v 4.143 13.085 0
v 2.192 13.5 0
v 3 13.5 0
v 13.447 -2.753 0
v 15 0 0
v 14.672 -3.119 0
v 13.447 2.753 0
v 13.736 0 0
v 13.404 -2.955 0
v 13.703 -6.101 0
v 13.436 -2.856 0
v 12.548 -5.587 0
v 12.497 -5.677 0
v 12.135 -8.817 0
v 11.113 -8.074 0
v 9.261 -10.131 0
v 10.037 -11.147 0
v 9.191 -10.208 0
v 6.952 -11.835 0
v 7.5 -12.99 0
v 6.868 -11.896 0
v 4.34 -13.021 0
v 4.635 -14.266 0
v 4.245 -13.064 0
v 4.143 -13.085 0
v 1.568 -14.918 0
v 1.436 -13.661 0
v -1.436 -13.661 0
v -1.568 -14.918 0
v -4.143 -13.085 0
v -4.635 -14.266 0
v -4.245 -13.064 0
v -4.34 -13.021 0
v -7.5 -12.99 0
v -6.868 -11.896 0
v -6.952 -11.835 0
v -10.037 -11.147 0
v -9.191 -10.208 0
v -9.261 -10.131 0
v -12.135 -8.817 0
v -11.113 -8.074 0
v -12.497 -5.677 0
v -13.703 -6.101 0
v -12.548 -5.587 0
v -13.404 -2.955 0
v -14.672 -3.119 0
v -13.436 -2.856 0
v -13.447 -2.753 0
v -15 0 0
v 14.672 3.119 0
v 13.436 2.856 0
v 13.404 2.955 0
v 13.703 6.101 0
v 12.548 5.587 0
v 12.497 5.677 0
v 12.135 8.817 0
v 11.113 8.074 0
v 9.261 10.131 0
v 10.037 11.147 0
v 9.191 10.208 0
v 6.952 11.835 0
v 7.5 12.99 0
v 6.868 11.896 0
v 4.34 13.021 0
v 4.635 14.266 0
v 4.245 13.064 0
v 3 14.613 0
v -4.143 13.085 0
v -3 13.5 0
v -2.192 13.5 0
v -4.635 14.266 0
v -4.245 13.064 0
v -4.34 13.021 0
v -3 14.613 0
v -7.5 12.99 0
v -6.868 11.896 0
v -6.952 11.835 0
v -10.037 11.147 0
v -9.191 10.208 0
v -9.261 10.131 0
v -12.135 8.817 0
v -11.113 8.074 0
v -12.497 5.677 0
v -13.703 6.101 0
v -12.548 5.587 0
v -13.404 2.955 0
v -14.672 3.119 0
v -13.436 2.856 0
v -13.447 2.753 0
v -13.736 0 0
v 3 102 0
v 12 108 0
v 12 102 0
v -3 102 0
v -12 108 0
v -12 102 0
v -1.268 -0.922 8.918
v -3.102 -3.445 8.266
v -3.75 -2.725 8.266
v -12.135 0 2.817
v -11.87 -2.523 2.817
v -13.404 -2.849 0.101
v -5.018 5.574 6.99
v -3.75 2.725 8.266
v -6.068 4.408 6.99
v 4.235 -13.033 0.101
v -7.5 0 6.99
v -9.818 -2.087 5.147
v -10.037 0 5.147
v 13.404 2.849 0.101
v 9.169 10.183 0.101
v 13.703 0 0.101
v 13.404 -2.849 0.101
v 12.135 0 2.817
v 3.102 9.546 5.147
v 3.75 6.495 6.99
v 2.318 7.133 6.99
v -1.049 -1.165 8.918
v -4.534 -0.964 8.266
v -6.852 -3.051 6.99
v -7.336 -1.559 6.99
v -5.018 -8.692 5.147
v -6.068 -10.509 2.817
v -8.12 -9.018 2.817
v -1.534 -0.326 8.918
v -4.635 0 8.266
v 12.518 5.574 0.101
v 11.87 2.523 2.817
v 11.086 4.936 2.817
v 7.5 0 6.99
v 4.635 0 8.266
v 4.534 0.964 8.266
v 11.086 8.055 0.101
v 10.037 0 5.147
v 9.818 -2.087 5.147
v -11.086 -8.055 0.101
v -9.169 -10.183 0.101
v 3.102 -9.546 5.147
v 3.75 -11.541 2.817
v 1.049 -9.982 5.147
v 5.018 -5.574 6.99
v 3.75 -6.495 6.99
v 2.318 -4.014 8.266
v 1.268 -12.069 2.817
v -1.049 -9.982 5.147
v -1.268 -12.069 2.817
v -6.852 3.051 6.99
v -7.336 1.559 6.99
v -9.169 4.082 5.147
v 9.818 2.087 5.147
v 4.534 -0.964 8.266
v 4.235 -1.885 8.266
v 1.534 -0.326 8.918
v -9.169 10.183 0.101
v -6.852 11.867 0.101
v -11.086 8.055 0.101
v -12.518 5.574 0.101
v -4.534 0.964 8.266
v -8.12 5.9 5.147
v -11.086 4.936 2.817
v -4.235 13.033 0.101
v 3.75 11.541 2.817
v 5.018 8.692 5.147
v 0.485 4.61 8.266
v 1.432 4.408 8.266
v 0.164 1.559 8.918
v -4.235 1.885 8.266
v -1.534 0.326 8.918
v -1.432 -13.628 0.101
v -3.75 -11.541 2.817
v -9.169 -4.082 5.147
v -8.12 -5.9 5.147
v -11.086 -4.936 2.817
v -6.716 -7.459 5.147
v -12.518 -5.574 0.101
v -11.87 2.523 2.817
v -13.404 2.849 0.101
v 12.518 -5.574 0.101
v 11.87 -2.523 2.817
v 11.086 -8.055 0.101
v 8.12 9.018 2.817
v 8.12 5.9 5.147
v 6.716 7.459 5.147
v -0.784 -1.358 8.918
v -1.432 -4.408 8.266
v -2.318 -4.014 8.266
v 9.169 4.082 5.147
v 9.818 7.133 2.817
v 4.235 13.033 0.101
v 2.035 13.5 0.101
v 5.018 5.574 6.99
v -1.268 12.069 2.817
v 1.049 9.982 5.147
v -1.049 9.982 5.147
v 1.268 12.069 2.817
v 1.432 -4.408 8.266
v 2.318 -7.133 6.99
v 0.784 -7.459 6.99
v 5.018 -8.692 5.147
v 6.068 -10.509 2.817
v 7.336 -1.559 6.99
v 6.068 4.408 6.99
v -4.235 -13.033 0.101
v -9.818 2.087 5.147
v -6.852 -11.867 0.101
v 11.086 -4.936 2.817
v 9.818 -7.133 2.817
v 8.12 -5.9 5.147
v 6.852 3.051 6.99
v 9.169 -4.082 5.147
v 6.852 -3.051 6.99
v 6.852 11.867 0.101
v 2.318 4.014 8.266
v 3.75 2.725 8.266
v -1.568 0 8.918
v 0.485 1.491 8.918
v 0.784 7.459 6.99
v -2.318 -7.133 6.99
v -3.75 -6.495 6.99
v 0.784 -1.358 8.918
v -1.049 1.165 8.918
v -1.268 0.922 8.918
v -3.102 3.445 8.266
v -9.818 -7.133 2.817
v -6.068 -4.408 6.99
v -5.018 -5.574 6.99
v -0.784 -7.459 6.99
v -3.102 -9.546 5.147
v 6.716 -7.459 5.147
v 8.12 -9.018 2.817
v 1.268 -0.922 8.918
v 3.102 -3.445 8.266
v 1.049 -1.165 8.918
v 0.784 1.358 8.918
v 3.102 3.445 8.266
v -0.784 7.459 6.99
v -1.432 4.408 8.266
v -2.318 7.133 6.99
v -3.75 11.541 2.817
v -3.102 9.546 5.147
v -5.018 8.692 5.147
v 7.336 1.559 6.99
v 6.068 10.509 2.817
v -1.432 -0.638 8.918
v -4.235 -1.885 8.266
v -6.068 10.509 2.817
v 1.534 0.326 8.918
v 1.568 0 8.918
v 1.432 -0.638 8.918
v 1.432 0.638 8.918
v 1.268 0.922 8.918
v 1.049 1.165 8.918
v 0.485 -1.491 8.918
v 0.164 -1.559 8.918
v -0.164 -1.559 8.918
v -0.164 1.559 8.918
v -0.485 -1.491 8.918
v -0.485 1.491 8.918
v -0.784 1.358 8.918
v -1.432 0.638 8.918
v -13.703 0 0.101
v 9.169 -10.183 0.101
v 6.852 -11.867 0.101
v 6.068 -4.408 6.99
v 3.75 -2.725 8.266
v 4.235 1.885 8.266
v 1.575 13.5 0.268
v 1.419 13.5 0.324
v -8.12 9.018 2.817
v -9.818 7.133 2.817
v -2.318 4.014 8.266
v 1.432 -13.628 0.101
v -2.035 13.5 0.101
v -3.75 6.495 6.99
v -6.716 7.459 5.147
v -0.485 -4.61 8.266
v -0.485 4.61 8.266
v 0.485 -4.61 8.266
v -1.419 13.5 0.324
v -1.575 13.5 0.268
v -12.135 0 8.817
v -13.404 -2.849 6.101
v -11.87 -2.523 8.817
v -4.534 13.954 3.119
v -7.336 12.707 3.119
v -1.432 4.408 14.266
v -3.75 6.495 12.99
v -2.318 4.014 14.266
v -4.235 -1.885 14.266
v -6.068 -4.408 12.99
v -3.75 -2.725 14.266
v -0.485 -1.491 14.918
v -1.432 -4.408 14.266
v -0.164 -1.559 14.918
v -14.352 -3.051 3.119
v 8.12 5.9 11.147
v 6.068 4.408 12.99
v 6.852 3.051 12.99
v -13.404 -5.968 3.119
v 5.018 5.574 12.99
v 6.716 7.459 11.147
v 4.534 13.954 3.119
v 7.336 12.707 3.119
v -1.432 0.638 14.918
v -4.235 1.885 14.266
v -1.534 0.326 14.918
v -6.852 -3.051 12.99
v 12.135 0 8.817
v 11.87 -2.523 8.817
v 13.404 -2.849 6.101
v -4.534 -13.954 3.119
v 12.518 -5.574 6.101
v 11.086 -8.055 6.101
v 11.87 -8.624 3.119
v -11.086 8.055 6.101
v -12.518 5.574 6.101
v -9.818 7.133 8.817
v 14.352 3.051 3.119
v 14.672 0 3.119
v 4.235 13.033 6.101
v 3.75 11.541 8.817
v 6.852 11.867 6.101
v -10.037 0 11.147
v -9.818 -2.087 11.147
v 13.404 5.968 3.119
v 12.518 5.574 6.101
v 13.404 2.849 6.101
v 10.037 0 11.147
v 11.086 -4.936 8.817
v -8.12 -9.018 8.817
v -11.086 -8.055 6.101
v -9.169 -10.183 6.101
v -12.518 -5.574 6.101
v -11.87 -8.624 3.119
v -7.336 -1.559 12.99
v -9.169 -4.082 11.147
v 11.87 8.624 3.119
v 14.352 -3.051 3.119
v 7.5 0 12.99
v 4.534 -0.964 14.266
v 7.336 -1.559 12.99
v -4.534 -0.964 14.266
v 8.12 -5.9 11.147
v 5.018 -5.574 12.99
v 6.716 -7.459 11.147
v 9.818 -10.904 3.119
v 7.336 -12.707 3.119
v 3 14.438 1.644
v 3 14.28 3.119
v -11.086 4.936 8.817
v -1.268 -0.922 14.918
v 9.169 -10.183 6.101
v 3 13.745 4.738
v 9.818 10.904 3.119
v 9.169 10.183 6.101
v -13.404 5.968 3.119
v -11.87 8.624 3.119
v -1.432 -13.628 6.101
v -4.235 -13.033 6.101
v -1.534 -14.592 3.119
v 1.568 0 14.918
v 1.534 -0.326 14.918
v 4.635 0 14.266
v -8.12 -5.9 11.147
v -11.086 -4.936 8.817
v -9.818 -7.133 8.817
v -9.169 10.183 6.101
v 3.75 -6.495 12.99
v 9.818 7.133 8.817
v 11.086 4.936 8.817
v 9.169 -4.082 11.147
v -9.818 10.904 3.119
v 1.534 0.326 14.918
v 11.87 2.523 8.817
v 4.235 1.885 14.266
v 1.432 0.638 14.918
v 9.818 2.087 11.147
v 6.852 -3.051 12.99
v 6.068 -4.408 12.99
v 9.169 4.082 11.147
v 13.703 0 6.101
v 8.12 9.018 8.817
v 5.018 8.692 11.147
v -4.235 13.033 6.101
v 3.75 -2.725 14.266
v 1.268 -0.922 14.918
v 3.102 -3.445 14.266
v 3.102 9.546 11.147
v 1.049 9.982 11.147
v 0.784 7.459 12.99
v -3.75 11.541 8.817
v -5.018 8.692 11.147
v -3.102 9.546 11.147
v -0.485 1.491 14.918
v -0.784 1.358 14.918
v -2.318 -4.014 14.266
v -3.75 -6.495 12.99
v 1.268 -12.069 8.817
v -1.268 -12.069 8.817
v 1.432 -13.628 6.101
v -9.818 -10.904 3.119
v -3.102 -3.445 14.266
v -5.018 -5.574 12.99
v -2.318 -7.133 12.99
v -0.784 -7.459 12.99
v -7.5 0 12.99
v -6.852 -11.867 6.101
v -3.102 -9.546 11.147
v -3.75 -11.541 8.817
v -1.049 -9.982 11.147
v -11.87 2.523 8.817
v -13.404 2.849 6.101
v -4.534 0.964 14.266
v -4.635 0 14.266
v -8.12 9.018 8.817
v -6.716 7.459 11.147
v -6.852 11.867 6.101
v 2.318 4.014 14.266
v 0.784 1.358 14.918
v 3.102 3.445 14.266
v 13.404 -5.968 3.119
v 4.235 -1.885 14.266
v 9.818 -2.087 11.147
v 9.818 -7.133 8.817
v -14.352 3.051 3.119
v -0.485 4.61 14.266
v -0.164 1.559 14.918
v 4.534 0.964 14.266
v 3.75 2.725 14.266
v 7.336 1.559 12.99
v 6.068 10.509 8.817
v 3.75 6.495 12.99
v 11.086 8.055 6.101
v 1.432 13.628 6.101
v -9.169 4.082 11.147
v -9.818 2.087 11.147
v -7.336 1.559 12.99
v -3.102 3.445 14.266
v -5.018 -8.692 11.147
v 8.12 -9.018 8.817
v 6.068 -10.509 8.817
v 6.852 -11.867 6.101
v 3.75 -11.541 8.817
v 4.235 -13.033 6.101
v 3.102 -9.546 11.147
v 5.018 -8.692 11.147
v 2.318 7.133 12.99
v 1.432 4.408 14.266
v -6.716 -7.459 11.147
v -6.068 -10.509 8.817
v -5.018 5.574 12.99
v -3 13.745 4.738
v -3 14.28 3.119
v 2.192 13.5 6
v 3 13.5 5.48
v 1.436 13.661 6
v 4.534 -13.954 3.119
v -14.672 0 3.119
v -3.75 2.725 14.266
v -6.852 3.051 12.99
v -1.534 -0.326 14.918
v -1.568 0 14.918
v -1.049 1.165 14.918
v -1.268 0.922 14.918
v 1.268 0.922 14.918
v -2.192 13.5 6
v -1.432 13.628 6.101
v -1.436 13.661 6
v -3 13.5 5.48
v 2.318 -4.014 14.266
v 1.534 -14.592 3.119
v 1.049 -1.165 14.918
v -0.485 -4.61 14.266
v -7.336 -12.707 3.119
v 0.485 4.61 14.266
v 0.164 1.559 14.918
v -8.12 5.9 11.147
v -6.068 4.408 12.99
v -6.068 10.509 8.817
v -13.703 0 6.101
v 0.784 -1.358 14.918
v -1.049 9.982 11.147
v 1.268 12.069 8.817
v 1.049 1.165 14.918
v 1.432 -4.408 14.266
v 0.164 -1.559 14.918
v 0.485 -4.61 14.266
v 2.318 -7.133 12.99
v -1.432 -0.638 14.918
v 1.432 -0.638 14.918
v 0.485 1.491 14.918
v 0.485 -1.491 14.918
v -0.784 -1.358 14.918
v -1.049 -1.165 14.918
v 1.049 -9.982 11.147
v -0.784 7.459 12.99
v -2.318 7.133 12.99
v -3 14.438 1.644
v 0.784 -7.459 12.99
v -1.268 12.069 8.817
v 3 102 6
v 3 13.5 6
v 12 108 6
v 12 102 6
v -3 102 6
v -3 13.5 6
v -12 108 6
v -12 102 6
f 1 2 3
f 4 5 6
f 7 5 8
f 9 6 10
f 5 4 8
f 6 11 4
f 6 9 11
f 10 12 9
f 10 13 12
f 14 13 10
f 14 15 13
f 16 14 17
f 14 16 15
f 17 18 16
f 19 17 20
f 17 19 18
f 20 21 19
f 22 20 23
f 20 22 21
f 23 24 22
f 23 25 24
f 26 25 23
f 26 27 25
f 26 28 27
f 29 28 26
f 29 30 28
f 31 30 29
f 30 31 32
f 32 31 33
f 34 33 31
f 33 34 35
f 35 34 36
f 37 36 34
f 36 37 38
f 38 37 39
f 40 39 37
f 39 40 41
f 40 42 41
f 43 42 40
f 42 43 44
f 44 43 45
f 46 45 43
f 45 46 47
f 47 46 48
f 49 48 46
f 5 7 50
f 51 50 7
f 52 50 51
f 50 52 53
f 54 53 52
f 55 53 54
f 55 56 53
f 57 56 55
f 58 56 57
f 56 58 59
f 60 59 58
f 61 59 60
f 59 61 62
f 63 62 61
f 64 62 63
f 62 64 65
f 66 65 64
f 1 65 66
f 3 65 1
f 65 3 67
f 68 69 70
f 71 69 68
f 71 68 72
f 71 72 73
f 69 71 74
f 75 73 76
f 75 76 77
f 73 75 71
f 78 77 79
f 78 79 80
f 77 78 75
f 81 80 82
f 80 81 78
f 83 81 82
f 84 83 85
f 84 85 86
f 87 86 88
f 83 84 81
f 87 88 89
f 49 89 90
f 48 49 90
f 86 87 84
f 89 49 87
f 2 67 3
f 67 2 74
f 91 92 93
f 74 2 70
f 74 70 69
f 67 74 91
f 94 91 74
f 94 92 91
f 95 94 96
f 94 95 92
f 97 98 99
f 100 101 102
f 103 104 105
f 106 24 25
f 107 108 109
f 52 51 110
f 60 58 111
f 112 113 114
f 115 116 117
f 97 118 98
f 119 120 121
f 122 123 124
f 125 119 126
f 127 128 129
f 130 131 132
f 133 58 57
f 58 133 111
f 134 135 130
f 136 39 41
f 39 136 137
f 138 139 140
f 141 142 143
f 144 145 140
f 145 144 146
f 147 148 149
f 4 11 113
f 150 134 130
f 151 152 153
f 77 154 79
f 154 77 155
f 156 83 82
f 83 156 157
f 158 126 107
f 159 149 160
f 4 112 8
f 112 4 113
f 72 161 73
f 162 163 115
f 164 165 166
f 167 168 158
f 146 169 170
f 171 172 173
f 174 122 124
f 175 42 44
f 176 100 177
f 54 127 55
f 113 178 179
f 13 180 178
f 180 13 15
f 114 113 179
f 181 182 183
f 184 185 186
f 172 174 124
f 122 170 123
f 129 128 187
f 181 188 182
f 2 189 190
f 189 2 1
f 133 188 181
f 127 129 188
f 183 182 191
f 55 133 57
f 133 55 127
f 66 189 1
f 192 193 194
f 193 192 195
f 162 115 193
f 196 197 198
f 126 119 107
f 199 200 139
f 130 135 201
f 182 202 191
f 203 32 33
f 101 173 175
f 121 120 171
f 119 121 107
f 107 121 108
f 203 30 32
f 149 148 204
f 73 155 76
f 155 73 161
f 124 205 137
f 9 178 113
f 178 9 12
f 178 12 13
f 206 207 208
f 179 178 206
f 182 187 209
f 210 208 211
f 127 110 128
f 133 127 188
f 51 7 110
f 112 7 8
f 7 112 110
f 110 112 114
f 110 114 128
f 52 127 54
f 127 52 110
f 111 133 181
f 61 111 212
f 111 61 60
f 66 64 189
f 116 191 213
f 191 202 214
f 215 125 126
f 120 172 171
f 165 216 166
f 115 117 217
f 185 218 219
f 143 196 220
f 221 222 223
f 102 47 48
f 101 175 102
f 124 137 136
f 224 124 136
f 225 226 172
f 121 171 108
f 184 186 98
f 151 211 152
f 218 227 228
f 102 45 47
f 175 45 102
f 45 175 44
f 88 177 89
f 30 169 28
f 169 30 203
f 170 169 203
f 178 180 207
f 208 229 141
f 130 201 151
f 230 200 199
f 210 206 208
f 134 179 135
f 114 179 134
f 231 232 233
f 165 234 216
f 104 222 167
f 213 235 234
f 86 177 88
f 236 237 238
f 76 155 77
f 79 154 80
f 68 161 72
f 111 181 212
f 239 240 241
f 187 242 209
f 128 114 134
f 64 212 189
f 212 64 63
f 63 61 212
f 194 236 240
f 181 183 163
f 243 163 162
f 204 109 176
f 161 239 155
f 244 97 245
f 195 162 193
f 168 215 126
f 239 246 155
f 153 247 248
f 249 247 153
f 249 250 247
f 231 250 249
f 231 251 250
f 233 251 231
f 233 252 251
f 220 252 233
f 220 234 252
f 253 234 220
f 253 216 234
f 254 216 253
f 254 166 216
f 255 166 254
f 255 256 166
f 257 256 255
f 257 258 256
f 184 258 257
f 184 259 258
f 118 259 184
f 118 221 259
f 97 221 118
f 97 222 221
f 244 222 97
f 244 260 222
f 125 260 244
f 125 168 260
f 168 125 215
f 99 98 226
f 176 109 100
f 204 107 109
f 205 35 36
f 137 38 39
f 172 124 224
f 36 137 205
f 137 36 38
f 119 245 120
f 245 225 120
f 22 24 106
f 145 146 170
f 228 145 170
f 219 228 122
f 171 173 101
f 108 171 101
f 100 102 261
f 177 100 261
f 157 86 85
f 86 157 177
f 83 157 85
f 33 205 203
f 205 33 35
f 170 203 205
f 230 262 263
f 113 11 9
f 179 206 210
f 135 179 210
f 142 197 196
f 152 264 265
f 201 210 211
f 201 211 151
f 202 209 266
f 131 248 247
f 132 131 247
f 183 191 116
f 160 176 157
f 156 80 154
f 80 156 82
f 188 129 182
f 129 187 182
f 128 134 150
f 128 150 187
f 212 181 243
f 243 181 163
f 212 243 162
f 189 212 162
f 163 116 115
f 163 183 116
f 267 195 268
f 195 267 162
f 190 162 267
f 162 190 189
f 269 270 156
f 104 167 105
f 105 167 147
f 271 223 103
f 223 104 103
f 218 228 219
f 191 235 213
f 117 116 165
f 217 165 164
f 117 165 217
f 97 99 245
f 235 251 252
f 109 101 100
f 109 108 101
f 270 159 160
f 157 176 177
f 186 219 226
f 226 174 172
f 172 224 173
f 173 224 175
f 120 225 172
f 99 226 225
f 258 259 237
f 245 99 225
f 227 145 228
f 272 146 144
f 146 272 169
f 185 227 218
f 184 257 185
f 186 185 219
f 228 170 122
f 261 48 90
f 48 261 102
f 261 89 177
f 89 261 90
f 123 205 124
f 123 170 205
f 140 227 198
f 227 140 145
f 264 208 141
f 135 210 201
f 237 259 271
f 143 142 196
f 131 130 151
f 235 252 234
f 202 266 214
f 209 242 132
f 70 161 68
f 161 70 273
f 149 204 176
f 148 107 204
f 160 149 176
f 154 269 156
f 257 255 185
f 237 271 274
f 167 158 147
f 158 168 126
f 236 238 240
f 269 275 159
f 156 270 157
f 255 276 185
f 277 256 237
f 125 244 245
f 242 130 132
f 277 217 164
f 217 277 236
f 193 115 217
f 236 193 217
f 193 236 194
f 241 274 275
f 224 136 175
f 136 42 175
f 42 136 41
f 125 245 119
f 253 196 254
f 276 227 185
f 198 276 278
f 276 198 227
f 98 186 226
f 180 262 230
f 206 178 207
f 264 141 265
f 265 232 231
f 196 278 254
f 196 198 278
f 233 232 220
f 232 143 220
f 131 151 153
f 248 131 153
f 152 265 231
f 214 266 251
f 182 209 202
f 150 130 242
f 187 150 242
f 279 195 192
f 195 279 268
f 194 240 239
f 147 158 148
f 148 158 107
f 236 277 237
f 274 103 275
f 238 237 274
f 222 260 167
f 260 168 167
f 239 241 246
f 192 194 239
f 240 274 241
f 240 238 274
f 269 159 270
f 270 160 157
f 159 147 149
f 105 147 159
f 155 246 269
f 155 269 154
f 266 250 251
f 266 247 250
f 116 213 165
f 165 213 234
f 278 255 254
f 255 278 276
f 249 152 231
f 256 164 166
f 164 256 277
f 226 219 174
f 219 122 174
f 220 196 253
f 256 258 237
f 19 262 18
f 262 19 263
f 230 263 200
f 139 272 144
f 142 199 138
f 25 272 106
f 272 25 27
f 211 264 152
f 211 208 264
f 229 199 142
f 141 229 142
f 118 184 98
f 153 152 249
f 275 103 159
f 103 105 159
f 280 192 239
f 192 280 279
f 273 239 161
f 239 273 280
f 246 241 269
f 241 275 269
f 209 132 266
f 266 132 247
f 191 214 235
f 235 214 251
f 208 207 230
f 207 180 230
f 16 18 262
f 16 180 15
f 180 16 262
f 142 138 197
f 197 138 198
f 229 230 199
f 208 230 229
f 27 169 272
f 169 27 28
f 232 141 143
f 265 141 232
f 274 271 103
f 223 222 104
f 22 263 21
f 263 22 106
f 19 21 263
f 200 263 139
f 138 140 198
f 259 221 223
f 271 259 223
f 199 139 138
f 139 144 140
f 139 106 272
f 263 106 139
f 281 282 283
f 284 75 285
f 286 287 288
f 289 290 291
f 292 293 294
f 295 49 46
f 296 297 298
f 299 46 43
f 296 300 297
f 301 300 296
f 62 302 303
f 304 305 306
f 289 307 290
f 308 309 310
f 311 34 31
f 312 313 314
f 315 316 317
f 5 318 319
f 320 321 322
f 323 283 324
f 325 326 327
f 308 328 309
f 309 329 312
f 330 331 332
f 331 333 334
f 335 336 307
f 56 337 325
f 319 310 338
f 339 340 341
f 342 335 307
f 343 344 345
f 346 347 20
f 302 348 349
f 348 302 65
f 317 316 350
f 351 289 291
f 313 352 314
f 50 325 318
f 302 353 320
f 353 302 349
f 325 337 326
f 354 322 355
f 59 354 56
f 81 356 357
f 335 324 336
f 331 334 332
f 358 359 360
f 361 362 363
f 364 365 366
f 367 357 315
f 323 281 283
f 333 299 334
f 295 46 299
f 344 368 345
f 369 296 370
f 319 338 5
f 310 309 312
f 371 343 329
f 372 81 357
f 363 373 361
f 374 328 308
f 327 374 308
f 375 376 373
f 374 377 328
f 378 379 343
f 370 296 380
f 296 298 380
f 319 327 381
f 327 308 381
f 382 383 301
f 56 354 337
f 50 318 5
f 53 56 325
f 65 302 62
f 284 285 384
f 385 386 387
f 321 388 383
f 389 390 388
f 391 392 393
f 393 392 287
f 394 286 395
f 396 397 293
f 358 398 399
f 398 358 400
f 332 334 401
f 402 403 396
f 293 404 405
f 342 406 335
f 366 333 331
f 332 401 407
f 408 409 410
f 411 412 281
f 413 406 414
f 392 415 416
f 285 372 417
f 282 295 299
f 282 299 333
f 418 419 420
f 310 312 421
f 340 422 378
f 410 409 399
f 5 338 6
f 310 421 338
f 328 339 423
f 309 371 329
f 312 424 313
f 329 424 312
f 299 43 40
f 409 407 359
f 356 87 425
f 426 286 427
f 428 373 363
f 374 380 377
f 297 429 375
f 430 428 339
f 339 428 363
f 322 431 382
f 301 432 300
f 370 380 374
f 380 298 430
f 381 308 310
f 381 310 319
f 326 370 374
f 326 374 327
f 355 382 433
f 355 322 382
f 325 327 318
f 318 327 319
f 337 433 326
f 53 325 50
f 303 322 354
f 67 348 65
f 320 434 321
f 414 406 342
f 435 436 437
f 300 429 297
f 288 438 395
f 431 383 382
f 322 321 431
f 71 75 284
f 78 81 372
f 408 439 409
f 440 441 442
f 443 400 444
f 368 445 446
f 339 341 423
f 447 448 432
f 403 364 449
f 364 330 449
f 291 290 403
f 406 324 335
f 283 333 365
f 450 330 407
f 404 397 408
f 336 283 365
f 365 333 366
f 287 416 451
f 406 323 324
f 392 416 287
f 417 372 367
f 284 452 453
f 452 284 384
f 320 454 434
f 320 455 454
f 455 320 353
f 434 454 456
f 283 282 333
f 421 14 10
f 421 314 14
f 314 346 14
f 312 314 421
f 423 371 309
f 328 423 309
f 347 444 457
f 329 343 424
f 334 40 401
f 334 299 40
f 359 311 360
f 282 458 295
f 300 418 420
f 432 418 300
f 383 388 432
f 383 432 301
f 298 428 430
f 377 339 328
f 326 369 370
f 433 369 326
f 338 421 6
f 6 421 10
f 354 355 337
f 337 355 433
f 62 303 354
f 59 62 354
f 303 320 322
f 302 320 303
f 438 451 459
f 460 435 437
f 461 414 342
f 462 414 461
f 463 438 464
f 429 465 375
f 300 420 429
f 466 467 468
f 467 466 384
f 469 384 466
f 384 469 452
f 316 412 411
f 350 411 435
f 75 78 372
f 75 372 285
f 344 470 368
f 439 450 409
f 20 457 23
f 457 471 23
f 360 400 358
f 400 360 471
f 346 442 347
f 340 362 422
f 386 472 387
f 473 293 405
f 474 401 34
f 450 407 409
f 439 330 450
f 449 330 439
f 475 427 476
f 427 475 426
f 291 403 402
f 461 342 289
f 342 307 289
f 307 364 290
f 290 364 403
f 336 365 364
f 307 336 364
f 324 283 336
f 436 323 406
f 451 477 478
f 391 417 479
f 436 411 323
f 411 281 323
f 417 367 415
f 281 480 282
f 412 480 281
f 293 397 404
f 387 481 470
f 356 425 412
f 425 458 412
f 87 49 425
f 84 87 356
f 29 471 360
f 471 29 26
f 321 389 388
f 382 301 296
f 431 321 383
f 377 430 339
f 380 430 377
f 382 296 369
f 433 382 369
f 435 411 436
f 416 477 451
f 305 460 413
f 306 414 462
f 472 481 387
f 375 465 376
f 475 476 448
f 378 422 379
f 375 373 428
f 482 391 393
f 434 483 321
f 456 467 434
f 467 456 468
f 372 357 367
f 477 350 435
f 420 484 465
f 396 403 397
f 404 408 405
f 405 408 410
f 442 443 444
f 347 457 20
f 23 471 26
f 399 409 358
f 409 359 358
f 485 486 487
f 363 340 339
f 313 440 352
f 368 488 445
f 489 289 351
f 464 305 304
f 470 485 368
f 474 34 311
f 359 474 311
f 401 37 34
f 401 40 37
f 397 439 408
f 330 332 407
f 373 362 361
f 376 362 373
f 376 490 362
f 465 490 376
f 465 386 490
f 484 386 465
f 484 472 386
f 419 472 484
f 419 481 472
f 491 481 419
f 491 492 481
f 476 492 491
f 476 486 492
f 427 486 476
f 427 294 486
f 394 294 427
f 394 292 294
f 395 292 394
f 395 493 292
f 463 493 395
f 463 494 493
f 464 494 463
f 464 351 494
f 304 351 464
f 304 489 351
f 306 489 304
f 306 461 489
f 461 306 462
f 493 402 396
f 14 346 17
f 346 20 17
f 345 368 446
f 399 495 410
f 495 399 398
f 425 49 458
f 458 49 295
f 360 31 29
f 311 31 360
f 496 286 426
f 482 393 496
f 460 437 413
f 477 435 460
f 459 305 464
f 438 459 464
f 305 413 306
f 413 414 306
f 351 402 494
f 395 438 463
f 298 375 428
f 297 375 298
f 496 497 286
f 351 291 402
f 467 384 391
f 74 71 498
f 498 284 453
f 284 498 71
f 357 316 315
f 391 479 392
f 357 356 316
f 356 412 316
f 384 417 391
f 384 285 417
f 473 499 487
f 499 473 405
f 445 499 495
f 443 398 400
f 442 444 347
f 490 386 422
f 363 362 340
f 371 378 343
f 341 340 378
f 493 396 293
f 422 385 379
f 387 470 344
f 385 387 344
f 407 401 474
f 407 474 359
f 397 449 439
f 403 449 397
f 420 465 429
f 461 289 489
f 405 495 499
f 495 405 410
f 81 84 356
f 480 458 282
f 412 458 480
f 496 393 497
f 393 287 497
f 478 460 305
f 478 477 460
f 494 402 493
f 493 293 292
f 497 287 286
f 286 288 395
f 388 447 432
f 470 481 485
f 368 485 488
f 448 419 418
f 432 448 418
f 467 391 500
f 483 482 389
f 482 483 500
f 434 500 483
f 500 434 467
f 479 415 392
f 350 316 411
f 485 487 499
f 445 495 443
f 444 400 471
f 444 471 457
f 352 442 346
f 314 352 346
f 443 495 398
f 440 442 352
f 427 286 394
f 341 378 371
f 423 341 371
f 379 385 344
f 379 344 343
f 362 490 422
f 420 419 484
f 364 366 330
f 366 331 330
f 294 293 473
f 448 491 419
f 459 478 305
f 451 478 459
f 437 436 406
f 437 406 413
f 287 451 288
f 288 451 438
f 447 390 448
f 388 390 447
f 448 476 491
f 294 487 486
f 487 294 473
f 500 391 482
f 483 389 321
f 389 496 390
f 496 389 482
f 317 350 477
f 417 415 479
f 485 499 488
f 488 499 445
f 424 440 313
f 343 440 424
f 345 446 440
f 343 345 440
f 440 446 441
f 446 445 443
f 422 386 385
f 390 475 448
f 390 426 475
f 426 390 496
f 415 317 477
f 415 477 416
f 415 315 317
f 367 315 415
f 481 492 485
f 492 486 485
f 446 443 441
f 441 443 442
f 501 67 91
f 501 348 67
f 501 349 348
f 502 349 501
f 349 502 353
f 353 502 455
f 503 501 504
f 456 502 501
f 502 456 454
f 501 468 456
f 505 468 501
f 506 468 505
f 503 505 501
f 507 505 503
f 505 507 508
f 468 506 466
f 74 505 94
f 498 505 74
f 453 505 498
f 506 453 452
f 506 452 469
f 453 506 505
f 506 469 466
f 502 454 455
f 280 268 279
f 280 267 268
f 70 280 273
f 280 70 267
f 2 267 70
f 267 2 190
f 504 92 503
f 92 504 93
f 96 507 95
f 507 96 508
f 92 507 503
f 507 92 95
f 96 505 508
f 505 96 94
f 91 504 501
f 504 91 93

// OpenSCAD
// Mereni rychlosti vetru
// snad odolna zamrznuti
// vnejsi prumer misky
dmiska = 30;
// tlouska steny misky
stena = 3;
// delka uchytu
luchyt = 3*dmiska;
// vnejsi prumer nosice
dnosic = 70;
// prumer nosne stredni tycky
dtycka = 8;
// vyska tycky
vtycka=20;
// vyska nosice
vnosic = 70;


module miska () {
 difference() {
    sphere(d=dmiska);
    union () {
     translate([0,0,-dmiska/2]) cube(size=dmiska, center=true);
     translate([0,0,-2*stena]) sphere(d=dmiska);
    }
 }
// uchyt
 uchyt_misky();
}

miska();
// translate([0,100,0]) miska();
// translate([1.5*dmiska,100,0]) miska();
// translate([3*dmiska,100,0]) miska();

module uchyt_misky() {
   translate([-stena,dmiska/2-stena/2,0]) cube([2*stena,luchyt,2*stena]);
   translate([-4*stena,dmiska/2+luchyt-stena,0]) cube([8*stena,2*stena,2*stena]);
}


// Nosna cast vnejsi

module venkovninosic() {
    difference() {
      union() {  
         cylinder(h=vnosic+8*stena,d=dnosic);
         // stredni tycka
         translate([0,0,vnosic-vtycka]) cylinder(h=2*vtycka,d=dtycka);
//         translate([0,0,vnosic]) sphere(d=dnosic); 
        }
      union() {
         translate([0,0,-stena]) cylinder(h=vnosic,d=dnosic-2*stena); 
         translate([-4*stena,-(dmiska/2+luchyt-stena),vnosic+7*stena]) rotate([0,90,0]) uchyt_misky(); 
         rotate([0,0,120]) translate([-4*stena,-(dmiska/2+luchyt-stena),vnosic+7*stena]) rotate([0,90,0]) uchyt_misky(); 
         rotate([0,0,240]) translate([-4*stena,-(dmiska/2+luchyt-stena),vnosic+7*stena]) rotate([0,90,0]) uchyt_misky(); 
         // otvor pro vrut/sroub
         translate([0,-(dnosic/2-4*stena),vnosic-2*stena]) cylinder(d=2.5, h=12*stena); 
         rotate([0,0,120]) translate([0,-(dnosic/2-4*stena),vnosic-2*stena]) cylinder(d=2.5, h=12*stena); 
         rotate([0,0,240]) translate([0,-(dnosic/2-4*stena),vnosic-2*stena]) cylinder(d=2.5, h=12*stena); 
        }   
      }  
     // stredni tycka
     translate([0,0,vnosic-vtycka]) cylinder(h=2*vtycka,d=dtycka);
}

// venkovninosic();

module vickonosice() {
    difference() {
      union() {  
         translate([0,0,vnosic+8*stena]) sphere(d=dnosic); 
        }
      union() {
         cylinder(h=vnosic+8*stena,d=dnosic);
         translate([-4*stena,-(dmiska/2+luchyt-stena),vnosic+7*stena]) rotate([0,90,0]) uchyt_misky(); 
         rotate([0,0,120]) translate([-4*stena,-(dmiska/2+luchyt-stena),vnosic+7*stena]) rotate([0,90,0]) uchyt_misky(); 
         rotate([0,0,240]) translate([-4*stena,-(dmiska/2+luchyt-stena),vnosic+7*stena]) rotate([0,90,0]) uchyt_misky(); 
         // otvor pro vrut/sroub
         translate([0,-(dnosic/2-4*stena),vnosic-stena]) cylinder(d=2.5, h=20*stena); 
         rotate([0,0,120]) translate([0,-(dnosic/2-4*stena),vnosic-stena]) cylinder(d=2.5, h=20*stena); 
         rotate([0,0,240]) translate([0,-(dnosic/2-4*stena),vnosic-stena]) cylinder(d=2.5, h=20*stena); 
         // otvor pro hlavu
         translate([0,-(dnosic/2-4*stena),vnosic+12*stena]) cylinder(d=6, h=12*stena); 
         rotate([0,0,120]) translate([0,-(dnosic/2-4*stena),vnosic+12*stena]) cylinder(d=6, h=12*stena); 
         rotate([0,0,240]) translate([0,-(dnosic/2-4*stena),vnosic+12*stena]) cylinder(d=6, h=12*stena); 
        }   
      }  
}

// vickonosice();
